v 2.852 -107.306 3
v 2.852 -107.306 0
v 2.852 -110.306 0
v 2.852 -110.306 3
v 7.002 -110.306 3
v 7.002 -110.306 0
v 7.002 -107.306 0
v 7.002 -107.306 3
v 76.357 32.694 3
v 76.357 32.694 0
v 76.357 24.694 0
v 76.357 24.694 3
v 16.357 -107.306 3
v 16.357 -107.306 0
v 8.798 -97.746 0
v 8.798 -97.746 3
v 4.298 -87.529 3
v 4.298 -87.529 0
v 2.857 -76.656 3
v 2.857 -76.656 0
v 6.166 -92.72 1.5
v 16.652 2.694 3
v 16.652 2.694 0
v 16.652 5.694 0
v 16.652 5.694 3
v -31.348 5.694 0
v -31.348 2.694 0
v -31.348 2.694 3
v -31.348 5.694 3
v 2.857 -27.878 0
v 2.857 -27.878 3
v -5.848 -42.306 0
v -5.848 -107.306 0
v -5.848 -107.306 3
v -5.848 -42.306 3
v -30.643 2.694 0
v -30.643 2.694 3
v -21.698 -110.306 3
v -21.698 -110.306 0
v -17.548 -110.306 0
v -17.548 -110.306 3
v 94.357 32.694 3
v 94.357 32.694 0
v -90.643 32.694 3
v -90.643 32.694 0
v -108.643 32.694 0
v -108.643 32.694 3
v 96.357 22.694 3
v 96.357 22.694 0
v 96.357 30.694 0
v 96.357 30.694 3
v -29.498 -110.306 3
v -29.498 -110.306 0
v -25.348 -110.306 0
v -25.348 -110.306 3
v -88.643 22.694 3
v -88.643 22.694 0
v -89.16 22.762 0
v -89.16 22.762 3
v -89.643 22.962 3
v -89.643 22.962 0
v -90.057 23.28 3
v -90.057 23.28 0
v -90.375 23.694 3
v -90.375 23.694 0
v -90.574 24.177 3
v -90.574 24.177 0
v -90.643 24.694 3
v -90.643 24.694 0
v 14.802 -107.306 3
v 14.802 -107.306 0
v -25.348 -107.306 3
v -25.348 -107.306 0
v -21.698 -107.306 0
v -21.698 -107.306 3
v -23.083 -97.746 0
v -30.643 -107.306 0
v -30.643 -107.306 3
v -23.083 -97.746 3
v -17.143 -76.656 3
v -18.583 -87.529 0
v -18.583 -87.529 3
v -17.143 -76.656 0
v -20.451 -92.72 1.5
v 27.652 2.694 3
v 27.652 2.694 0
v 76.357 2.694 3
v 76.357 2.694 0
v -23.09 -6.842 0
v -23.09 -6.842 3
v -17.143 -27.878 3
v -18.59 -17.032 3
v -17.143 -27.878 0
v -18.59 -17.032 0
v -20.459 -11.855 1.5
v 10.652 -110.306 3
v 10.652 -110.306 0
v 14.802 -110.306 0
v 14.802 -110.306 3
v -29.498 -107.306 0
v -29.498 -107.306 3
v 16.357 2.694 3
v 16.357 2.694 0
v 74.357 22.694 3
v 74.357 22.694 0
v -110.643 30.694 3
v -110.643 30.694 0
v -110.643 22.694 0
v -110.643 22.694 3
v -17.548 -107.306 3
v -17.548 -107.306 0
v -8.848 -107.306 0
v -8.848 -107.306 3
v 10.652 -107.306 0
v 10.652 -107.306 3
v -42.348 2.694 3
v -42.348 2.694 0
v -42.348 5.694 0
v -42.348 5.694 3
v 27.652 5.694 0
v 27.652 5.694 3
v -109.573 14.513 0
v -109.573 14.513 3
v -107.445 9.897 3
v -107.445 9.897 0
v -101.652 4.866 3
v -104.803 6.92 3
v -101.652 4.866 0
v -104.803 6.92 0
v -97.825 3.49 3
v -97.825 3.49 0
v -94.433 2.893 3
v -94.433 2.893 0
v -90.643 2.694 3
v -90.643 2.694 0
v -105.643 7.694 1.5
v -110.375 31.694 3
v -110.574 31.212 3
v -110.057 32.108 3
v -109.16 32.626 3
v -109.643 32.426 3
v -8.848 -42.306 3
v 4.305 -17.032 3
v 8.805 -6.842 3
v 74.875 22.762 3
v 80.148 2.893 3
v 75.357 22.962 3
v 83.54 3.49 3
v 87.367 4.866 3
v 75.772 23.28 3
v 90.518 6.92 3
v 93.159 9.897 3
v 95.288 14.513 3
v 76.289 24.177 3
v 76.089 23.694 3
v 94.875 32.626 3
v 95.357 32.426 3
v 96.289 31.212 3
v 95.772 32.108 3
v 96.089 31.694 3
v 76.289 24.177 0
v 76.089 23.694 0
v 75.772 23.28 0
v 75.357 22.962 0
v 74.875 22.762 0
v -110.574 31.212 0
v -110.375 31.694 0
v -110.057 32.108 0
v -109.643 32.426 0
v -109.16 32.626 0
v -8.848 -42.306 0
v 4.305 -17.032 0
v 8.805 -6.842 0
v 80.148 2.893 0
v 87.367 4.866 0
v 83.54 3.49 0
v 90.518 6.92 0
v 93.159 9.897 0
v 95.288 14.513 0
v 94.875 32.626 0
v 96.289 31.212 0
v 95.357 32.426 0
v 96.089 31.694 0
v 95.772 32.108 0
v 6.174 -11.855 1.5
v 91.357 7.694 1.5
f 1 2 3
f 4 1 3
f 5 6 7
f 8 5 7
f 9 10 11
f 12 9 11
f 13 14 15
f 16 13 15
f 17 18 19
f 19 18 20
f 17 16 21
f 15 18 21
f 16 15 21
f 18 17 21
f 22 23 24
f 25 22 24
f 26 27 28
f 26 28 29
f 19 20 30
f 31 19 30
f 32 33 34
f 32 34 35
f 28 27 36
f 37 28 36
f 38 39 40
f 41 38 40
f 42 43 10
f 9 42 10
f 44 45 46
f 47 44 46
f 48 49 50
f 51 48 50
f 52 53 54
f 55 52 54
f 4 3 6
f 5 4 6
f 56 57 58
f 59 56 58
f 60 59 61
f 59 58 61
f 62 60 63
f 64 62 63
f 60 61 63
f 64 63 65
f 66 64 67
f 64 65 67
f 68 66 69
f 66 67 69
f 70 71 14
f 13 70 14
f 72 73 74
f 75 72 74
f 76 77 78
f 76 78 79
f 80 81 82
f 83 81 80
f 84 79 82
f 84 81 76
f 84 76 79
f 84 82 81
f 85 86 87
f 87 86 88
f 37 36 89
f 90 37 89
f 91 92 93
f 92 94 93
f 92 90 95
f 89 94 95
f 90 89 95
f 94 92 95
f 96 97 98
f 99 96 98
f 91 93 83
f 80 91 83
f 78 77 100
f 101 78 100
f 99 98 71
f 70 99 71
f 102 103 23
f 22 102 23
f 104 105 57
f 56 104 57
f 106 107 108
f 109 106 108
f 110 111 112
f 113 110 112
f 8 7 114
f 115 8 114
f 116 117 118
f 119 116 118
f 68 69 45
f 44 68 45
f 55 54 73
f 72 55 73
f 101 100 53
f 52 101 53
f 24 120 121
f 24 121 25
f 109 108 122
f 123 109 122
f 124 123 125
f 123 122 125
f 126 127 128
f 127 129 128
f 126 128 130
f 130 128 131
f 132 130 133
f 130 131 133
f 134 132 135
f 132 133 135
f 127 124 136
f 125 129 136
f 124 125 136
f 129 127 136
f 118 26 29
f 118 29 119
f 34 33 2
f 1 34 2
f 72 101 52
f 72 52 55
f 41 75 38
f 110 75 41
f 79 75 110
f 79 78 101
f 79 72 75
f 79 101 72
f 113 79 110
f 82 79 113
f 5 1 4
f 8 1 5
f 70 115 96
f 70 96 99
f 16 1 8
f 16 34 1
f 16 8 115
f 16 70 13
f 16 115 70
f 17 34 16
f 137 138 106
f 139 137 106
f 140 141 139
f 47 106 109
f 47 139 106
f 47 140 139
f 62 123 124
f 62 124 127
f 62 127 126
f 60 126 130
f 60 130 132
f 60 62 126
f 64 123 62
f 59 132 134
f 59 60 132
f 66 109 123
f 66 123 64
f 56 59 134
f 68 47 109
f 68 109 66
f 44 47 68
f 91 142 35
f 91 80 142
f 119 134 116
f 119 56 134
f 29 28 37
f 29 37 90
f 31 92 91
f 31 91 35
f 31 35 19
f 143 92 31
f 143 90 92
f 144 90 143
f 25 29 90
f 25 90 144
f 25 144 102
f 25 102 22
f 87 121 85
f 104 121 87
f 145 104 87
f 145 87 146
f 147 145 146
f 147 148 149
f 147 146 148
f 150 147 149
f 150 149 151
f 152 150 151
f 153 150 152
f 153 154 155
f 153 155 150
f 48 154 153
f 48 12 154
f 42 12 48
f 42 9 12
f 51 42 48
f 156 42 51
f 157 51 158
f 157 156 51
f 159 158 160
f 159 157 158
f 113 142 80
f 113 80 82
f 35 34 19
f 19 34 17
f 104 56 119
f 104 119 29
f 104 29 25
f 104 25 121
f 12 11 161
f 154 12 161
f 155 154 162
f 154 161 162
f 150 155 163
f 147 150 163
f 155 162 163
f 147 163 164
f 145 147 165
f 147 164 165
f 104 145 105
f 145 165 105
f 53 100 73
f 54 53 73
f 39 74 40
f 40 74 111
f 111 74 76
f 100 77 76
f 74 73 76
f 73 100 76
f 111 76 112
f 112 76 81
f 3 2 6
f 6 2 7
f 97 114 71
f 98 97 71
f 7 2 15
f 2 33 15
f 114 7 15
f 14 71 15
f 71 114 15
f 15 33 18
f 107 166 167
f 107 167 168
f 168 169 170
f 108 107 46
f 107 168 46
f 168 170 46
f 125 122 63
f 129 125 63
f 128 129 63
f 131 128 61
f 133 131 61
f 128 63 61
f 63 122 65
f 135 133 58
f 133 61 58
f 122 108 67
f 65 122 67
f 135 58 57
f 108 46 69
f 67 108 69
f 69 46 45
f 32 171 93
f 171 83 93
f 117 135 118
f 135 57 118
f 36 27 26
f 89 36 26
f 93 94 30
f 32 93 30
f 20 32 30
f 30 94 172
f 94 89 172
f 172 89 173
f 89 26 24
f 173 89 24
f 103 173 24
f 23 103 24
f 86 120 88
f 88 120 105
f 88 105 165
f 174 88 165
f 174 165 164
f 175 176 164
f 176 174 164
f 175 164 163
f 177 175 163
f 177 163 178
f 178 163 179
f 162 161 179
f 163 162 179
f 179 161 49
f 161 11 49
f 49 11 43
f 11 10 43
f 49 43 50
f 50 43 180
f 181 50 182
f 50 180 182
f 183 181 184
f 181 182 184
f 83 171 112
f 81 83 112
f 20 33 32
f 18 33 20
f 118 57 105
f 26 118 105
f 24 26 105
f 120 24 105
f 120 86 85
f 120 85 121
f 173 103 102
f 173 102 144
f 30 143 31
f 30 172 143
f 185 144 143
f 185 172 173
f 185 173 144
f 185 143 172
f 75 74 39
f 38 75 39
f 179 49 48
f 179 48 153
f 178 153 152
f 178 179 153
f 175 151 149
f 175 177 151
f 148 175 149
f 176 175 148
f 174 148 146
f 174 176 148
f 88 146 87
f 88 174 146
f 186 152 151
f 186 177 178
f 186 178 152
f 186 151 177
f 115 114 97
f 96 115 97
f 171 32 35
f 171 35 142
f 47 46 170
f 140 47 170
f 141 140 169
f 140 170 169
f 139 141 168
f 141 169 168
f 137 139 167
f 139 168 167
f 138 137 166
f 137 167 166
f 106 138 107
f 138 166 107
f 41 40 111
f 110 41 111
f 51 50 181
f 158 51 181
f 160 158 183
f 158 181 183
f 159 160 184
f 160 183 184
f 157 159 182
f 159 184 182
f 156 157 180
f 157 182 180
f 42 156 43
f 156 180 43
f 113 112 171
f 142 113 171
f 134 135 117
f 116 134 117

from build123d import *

# Parameters (mm, degrees)
P_IDAT_VYSUNUT_M2_DEPTH  = 3
SKICA2_W                 = 3
SKICA2_H                 = 65
ODEBRAT_VYSUNUT_M3_DEPTH = 3
SKICA3_W                 = 11
SKICA3_H                 = 5.694256757
ODEBRAT_VYSUNUT_M4_DEPTH = 3


with BuildPart() as part:
    # Skica1 → Přidat vysunutím2 (new body)
    with BuildSketch(Plane.XY):
        with BuildLine():
            Line((-90.642636358, 2.694256757), (-30.642636358, 2.694256757))
            add(Edge.make_bspline(
                [(-30.642636358, 2.694256757), (-17.025139471, -11.118063286), (-17.142636358, -27.878389443)],
                knots=[0, 0, 0, 1, 1, 1], degree=2))
            Line((-17.142636358, -27.878389443), (-17.142636358, -76.655981804))
            add(Edge.make_bspline(
                [(-30.642636358, -107.305743243), (-17.009316786, -93.458261678), (-17.142636358, -76.655981804)],
                knots=[0, 0, 0, 1, 1, 1], degree=2))
            Line((-30.642636358, -107.305743243), (-29.497972973, -107.305743243))
            Line((-29.497972973, -107.305743243), (-29.497972973, -110.305743243))
            Line((-29.497972973, -110.305743243), (-25.347972973, -110.305743243))
            Line((-25.347972973, -110.305743243), (-25.347972973, -107.305743243))
            Line((-25.347972973, -107.305743243), (-21.697972973, -107.305743243))
            Line((-21.697972973, -107.305743243), (-21.697972973, -110.305743243))
            Line((-21.697972973, -110.305743243), (-17.547972973, -110.305743243))
            Line((-17.547972973, -110.305743243), (-17.547972973, -107.305743243))
            Line((-17.547972973, -107.305743243), (2.852027027, -107.305743243))
            Line((2.852027027, -107.305743243), (2.852027027, -110.305743243))
            Line((2.852027027, -110.305743243), (7.002027027, -110.305743243))
            Line((7.002027027, -110.305743243), (7.002027027, -107.305743243))
            Line((7.002027027, -107.305743243), (10.652027027, -107.305743243))
            Line((10.652027027, -107.305743243), (10.652027027, -110.305743243))
            Line((10.652027027, -110.305743243), (14.802027027, -110.305743243))
            Line((14.802027027, -110.305743243), (14.802027027, -107.305743243))
            Line((14.802027027, -107.305743243), (16.357363642, -107.305743243))
            add(Edge.make_bspline(
                [(16.357363642, -107.305743243), (2.72404407, -93.458261678), (2.857363642, -76.655981804)],
                knots=[0, 0, 0, 1, 1, 1], degree=2))
            Line((2.857363642, -76.655981804), (2.857363642, -27.878389443))
            add(Edge.make_bspline(
                [(16.357363642, 2.694256757), (2.739866756, -11.118063286), (2.857363642, -27.878389443)],
                knots=[0, 0, 0, 1, 1, 1], degree=2))
            Line((16.357363642, 2.694256757), (76.357363642, 2.694256757))
            add(Edge.make_bspline(
                [(96.357363642, 22.694256757), (96.357363642, 2.694256757), (76.357363642, 2.694256757)],
                knots=[0, 0, 0, 1, 1, 1], degree=2))
            Line((96.357363642, 22.694256757), (96.357363642, 30.694256757))
            ThreePointArc((96.357363642, 30.694256757), (95.771577204, 32.108470319), (94.357363642, 32.694256757))
            Line((94.357363642, 32.694256757), (76.357363642, 32.694256757))
            Line((76.357363642, 32.694256757), (76.357363642, 24.694256757))
            ThreePointArc((76.357363642, 24.694256757), (75.771577204, 23.280043194), (74.357363642, 22.694256757))
            Line((74.357363642, 22.694256757), (-88.642636358, 22.694256757))
            ThreePointArc((-88.642636358, 22.694256757), (-90.05684992, 23.280043194), (-90.642636358, 24.694256757))
            Line((-90.642636358, 24.694256757), (-90.642636358, 32.694256757))
            Line((-90.642636358, 32.694256757), (-108.642636358, 32.694256757))
            ThreePointArc((-108.642636358, 32.694256757), (-110.05684992, 32.108470319), (-110.642636358, 30.694256757))
            Line((-110.642636358, 30.694256757), (-110.642636358, 22.694256757))
            add(Edge.make_bspline(
                [(-110.642636358, 22.694256757), (-110.642636358, 2.694256757), (-90.642636358, 2.694256757)],
                knots=[0, 0, 0, 1, 1, 1], degree=2))
        make_face()
    extrude(amount=P_IDAT_VYSUNUT_M2_DEPTH)

    # Skica2 → Odebrat vysunutím3 (cut)
    with BuildSketch(Plane(origin=(0, 0, 0), x_dir=(-1, 0, 0), z_dir=(0, 0, -1))):
        with Locations((7.347972973, -74.805743243)):
            Rectangle(SKICA2_W, SKICA2_H)
    extrude(amount=-ODEBRAT_VYSUNUT_M3_DEPTH, mode=Mode.SUBTRACT)

    # Skica3 → Odebrat vysunutím4 (cut)
    with BuildSketch(Plane(origin=(0, 0, 0), x_dir=(-1, 0, 0), z_dir=(0, 0, -1))):
        with Locations((-22.152027027, 2.847128379)):
            Rectangle(SKICA3_W, SKICA3_H)
        with Locations((36.847972973, 2.847128379)):
            Rectangle(SKICA3_W, SKICA3_H)
    extrude(amount=-ODEBRAT_VYSUNUT_M4_DEPTH, mode=Mode.SUBTRACT)


solid = part.part
